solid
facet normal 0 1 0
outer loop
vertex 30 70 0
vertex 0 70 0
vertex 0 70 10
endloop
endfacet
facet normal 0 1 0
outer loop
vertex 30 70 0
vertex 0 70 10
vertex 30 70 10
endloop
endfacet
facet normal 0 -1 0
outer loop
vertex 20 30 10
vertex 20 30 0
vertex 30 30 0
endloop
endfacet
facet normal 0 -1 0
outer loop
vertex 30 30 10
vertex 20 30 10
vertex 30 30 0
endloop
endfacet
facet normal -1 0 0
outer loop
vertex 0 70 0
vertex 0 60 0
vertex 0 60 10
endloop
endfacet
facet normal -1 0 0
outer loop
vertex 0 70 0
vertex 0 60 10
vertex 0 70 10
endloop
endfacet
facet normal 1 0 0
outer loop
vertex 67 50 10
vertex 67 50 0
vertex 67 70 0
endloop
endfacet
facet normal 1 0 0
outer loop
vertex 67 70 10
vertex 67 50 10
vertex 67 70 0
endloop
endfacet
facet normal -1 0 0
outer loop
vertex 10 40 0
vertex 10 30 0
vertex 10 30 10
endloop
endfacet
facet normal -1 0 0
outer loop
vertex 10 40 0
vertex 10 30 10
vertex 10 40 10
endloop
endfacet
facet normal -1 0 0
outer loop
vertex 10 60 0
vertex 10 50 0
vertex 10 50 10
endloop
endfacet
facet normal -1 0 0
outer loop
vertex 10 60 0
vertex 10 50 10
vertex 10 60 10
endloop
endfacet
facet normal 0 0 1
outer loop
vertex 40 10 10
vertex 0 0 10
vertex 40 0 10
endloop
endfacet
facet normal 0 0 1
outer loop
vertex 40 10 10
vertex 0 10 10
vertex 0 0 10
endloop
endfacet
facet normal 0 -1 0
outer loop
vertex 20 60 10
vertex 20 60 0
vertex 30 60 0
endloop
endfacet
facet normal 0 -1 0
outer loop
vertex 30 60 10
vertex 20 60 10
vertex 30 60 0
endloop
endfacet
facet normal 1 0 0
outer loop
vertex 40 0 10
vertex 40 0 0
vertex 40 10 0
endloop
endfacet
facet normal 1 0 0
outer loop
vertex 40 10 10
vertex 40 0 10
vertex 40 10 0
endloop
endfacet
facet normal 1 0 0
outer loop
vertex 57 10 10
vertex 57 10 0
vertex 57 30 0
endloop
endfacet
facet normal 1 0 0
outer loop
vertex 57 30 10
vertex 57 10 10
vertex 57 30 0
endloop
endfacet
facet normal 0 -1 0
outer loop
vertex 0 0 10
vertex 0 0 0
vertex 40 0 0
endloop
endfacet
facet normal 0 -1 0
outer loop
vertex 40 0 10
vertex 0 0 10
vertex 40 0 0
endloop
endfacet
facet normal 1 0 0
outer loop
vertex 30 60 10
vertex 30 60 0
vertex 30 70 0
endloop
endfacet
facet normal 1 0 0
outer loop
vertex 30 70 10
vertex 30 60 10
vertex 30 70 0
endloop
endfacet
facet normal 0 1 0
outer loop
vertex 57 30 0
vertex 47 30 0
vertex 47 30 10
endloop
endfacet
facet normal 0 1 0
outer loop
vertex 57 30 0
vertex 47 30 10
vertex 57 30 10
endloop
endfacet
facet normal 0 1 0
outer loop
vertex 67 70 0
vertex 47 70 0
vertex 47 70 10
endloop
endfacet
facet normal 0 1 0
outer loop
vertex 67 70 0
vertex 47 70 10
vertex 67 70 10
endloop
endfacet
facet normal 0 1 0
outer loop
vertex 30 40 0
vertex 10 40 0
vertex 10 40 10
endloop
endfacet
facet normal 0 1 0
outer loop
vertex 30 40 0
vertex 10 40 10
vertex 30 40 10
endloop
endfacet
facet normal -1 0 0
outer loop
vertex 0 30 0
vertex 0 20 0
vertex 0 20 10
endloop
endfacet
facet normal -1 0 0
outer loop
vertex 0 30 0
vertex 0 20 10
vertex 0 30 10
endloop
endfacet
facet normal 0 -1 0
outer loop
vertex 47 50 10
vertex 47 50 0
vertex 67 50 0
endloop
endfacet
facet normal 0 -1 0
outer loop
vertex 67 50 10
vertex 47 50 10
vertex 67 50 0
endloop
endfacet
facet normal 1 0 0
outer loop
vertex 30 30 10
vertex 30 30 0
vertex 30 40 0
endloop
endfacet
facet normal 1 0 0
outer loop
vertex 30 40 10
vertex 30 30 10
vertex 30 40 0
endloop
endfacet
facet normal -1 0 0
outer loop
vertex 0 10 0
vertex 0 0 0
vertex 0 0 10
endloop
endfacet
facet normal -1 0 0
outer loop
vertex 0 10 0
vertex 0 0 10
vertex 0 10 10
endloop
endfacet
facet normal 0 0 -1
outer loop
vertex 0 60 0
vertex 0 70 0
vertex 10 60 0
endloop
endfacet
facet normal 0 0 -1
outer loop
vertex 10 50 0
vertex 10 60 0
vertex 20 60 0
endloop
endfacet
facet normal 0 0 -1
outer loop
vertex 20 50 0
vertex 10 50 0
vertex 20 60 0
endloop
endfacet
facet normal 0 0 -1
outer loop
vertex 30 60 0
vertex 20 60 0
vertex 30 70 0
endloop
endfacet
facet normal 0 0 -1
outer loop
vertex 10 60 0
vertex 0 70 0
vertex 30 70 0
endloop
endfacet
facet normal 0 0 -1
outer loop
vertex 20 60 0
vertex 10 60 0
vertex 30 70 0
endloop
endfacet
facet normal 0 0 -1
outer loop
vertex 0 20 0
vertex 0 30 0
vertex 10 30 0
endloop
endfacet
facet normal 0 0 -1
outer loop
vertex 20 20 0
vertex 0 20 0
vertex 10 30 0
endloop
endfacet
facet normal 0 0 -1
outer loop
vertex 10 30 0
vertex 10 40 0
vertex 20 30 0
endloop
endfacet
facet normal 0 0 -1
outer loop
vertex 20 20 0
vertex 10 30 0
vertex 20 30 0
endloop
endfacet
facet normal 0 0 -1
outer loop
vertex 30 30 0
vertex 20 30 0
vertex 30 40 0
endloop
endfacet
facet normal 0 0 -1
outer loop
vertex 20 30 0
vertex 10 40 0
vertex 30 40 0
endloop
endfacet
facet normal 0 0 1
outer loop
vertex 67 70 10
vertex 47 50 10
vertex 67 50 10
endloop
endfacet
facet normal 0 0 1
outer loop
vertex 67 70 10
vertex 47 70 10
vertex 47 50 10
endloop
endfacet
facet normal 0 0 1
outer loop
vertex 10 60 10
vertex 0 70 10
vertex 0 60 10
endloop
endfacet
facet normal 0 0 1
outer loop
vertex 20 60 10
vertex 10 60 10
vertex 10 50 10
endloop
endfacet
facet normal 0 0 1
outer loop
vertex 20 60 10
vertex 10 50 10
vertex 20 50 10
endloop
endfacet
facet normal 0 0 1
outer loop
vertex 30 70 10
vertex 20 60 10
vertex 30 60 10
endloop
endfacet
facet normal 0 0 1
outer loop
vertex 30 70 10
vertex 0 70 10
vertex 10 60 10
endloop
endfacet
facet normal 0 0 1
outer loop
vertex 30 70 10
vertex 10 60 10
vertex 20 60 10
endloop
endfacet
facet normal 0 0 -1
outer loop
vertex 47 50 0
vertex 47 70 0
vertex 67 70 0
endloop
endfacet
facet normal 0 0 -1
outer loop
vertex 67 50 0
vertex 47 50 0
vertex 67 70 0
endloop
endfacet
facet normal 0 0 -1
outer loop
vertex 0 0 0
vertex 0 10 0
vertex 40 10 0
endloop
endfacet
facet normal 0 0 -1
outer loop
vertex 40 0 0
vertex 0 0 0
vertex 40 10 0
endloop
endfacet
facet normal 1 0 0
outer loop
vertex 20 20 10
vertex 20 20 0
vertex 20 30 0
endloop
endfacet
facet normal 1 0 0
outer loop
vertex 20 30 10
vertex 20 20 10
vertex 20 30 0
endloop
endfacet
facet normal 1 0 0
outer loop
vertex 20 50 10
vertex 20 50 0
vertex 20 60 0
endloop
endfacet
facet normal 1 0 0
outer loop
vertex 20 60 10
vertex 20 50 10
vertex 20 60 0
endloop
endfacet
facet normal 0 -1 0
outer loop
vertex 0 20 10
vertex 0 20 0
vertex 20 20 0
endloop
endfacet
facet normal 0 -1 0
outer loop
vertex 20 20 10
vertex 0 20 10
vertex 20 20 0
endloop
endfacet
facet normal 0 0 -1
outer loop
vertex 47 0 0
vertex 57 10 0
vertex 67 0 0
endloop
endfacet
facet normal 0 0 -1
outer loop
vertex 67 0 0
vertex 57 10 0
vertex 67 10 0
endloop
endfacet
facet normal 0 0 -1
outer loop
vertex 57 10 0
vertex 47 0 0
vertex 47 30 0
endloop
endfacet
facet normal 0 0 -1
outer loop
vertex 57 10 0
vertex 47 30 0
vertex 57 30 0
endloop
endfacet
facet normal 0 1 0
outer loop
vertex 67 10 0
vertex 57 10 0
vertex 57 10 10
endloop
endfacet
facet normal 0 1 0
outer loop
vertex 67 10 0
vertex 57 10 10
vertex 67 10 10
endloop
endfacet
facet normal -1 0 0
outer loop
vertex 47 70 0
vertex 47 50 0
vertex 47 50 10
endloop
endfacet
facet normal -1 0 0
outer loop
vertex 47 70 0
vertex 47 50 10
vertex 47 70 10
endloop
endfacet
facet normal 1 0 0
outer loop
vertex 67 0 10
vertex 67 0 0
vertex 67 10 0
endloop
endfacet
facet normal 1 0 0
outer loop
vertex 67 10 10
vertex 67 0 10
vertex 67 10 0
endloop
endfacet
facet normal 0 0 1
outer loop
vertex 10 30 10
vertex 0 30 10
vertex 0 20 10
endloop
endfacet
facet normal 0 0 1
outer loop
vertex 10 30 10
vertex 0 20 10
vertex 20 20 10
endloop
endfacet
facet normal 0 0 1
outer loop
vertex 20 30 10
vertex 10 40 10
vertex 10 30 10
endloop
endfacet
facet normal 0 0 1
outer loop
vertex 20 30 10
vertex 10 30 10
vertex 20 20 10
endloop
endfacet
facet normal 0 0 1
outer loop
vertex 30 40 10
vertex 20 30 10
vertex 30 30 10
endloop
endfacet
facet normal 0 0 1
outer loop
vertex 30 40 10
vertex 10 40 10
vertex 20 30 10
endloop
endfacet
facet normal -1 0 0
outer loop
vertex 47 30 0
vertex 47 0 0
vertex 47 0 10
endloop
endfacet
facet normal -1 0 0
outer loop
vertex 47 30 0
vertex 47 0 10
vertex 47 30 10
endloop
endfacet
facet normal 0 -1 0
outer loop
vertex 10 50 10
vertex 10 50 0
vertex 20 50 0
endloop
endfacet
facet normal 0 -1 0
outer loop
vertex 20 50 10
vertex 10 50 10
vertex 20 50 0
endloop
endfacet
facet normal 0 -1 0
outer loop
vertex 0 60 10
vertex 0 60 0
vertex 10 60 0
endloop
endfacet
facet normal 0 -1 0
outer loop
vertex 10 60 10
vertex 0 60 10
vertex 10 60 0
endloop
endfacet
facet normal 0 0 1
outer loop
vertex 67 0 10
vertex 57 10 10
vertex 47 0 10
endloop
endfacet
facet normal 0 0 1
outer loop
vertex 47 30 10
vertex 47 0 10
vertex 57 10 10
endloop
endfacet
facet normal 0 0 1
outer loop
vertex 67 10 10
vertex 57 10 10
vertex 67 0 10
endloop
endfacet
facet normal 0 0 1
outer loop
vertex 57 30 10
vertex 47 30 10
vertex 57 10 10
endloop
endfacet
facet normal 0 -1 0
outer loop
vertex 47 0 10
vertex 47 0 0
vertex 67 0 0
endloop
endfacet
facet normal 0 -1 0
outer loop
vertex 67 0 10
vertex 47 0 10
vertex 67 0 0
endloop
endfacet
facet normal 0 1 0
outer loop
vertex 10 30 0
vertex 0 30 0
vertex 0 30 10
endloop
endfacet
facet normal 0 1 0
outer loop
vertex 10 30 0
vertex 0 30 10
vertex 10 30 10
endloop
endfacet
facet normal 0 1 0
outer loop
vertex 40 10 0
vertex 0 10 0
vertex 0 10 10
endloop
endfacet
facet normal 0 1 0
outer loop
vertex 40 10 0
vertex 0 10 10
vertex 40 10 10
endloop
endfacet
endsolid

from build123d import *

# Parameters (mm, degrees)
BOX001_W     = 10
BOX001_H     = 10
BOX001_DEPTH = 10
BOX002_W     = 10
BOX002_H     = 10
BOX002_DEPTH = 10
BOX003_W     = 10
BOX003_H     = 10
BOX003_DEPTH = 10
BOX_W        = 10
BOX_H        = 10
BOX_DEPTH    = 10
BOX005_W     = 10
BOX005_H     = 10
BOX005_DEPTH = 10
BOX006_W     = 10
BOX006_H     = 10
BOX006_DEPTH = 10
BOX007_W     = 10
BOX007_H     = 10
BOX007_DEPTH = 10
BOX004_W     = 10
BOX004_H     = 10
BOX004_DEPTH = 10
BOX009_W     = 10
BOX009_H     = 10
BOX009_DEPTH = 10
BOX010_W     = 10
BOX010_H     = 10
BOX010_DEPTH = 10
BOX011_W     = 10
BOX011_H     = 10
BOX011_DEPTH = 10
BOX008_W     = 10
BOX008_H     = 10
BOX008_DEPTH = 10
BOX013_W     = 10
BOX013_H     = 10
BOX013_DEPTH = 10
BOX014_W     = 10
BOX014_H     = 10
BOX014_DEPTH = 10
BOX015_W     = 10
BOX015_H     = 10
BOX015_DEPTH = 10
BOX012_W     = 10
BOX012_H     = 10
BOX012_DEPTH = 10
BOX017_W     = 10
BOX017_H     = 10
BOX017_DEPTH = 10
BOX018_W     = 10
BOX018_H     = 10
BOX018_DEPTH = 10
BOX019_W     = 10
BOX019_H     = 10
BOX019_DEPTH = 10
BOX016_W     = 10
BOX016_H     = 10
BOX016_DEPTH = 10


with BuildPart() as cube001:
    # Box001 → Box001 (new body)
    with BuildSketch(Plane(origin=(10, 0, 0), x_dir=(1, 0, 0), z_dir=(0, 0, 1))):
        with Locations((5, 5)):
            Rectangle(BOX001_W, BOX001_H)
    extrude(amount=BOX001_DEPTH)


with BuildPart() as cube002:
    # Box002 → Box002 (new body)
    with BuildSketch(Plane(origin=(20, 0, 0), x_dir=(1, 0, 0), z_dir=(0, 0, 1))):
        with Locations((5, 5)):
            Rectangle(BOX002_W, BOX002_H)
    extrude(amount=BOX002_DEPTH)


with BuildPart() as cube003:
    # Box003 → Box003 (new body)
    with BuildSketch(Plane(origin=(30, 0, 0), x_dir=(1, 0, 0), z_dir=(0, 0, 1))):
        with Locations((5, 5)):
            Rectangle(BOX003_W, BOX003_H)
    extrude(amount=BOX003_DEPTH)


with BuildPart() as vermell:
    # Box → Box (new body)
    with BuildSketch(Plane.XY):
        with Locations((5, 5)):
            Rectangle(BOX_W, BOX_H)
    extrude(amount=BOX_DEPTH)

    # Fusion: union Cube001, Cube002, Cube003
    add(cube001.part)
    add(cube002.part)
    add(cube003.part)


with BuildPart() as cube005:
    # Box005 → Box005 (new body)
    with BuildSketch(Plane(origin=(57, 0, 0), x_dir=(1, 0, 0), z_dir=(0, 0, 1))):
        with Locations((5, 5)):
            Rectangle(BOX005_W, BOX005_H)
    extrude(amount=BOX005_DEPTH)


with BuildPart() as cube006:
    # Box006 → Box006 (new body)
    with BuildSketch(Plane(origin=(47, 10, 0), x_dir=(1, 0, 0), z_dir=(0, 0, 1))):
        with Locations((5, 5)):
            Rectangle(BOX006_W, BOX006_H)
    extrude(amount=BOX006_DEPTH)


with BuildPart() as cube007:
    # Box007 → Box007 (new body)
    with BuildSketch(Plane(origin=(47, 20, 0), x_dir=(1, 0, 0), z_dir=(0, 0, 1))):
        with Locations((5, 5)):
            Rectangle(BOX007_W, BOX007_H)
    extrude(amount=BOX007_DEPTH)


with BuildPart() as groc:
    # Box004 → Box004 (new body)
    with BuildSketch(Plane(origin=(47, 0, 0), x_dir=(1, 0, 0), z_dir=(0, 0, 1))):
        with Locations((5, 5)):
            Rectangle(BOX004_W, BOX004_H)
    extrude(amount=BOX004_DEPTH)

    # Fusion001: union Cube005, Cube006, Cube007
    add(cube005.part)
    add(cube006.part)
    add(cube007.part)


with BuildPart() as cube009:
    # Box009 → Box009 (new body)
    with BuildSketch(Plane(origin=(10, 20, 0), x_dir=(1, 0, 0), z_dir=(0, 0, 1))):
        with Locations((5, 5)):
            Rectangle(BOX009_W, BOX009_H)
    extrude(amount=BOX009_DEPTH)


with BuildPart() as cube010:
    # Box010 → Box010 (new body)
    with BuildSketch(Plane(origin=(10, 30, 0), x_dir=(1, 0, 0), z_dir=(0, 0, 1))):
        with Locations((5, 5)):
            Rectangle(BOX010_W, BOX010_H)
    extrude(amount=BOX010_DEPTH)


with BuildPart() as cube011:
    # Box011 → Box011 (new body)
    with BuildSketch(Plane(origin=(20, 30, 0), x_dir=(1, 0, 0), z_dir=(0, 0, 1))):
        with Locations((5, 5)):
            Rectangle(BOX011_W, BOX011_H)
    extrude(amount=BOX011_DEPTH)


with BuildPart() as blau:
    # Box008 → Box008 (new body)
    with BuildSketch(Plane(origin=(0, 20, 0), x_dir=(1, 0, 0), z_dir=(0, 0, 1))):
        with Locations((5, 5)):
            Rectangle(BOX008_W, BOX008_H)
    extrude(amount=BOX008_DEPTH)

    # Fusion002: union Cube009, Cube010, Cube011
    add(cube009.part)
    add(cube010.part)
    add(cube011.part)


with BuildPart() as cube013:
    # Box013 → Box013 (new body)
    with BuildSketch(Plane(origin=(0, 60, 0), x_dir=(1, 0, 0), z_dir=(0, 0, 1))):
        with Locations((5, 5)):
            Rectangle(BOX013_W, BOX013_H)
    extrude(amount=BOX013_DEPTH)


with BuildPart() as cube014:
    # Box014 → Box014 (new body)
    with BuildSketch(Plane(origin=(10, 60, 0), x_dir=(1, 0, 0), z_dir=(0, 0, 1))):
        with Locations((5, 5)):
            Rectangle(BOX014_W, BOX014_H)
    extrude(amount=BOX014_DEPTH)


with BuildPart() as cube015:
    # Box015 → Box015 (new body)
    with BuildSketch(Plane(origin=(20, 60, 0), x_dir=(1, 0, 0), z_dir=(0, 0, 1))):
        with Locations((5, 5)):
            Rectangle(BOX015_W, BOX015_H)
    extrude(amount=BOX015_DEPTH)


with BuildPart() as gris:
    # Box012 → Box012 (new body)
    with BuildSketch(Plane(origin=(10, 50, 0), x_dir=(1, 0, 0), z_dir=(0, 0, 1))):
        with Locations((5, 5)):
            Rectangle(BOX012_W, BOX012_H)
    extrude(amount=BOX012_DEPTH)

    # Fusion003: union Cube013, Cube014, Cube015
    add(cube013.part)
    add(cube014.part)
    add(cube015.part)


with BuildPart() as cube017:
    # Box017 → Box017 (new body)
    with BuildSketch(Plane(origin=(47, 50, 0), x_dir=(1, 0, 0), z_dir=(0, 0, 1))):
        with Locations((5, 5)):
            Rectangle(BOX017_W, BOX017_H)
    extrude(amount=BOX017_DEPTH)


with BuildPart() as cube018:
    # Box018 → Box018 (new body)
    with BuildSketch(Plane(origin=(57, 60, 0), x_dir=(1, 0, 0), z_dir=(0, 0, 1))):
        with Locations((5, 5)):
            Rectangle(BOX018_W, BOX018_H)
    extrude(amount=BOX018_DEPTH)


with BuildPart() as cube019:
    # Box019 → Box019 (new body)
    with BuildSketch(Plane(origin=(57, 50, 0), x_dir=(1, 0, 0), z_dir=(0, 0, 1))):
        with Locations((5, 5)):
            Rectangle(BOX019_W, BOX019_H)
    extrude(amount=BOX019_DEPTH)


with BuildPart() as blau_cel:
    # Box016 → Box016 (new body)
    with BuildSketch(Plane(origin=(47, 60, 0), x_dir=(1, 0, 0), z_dir=(0, 0, 1))):
        with Locations((5, 5)):
            Rectangle(BOX016_W, BOX016_H)
    extrude(amount=BOX016_DEPTH)

    # Fusion004: union Cube017, Cube018, Cube019
    add(cube017.part)
    add(cube018.part)
    add(cube019.part)


solid = Compound([vermell.part, groc.part, blau.part, gris.part, blau_cel.part])
